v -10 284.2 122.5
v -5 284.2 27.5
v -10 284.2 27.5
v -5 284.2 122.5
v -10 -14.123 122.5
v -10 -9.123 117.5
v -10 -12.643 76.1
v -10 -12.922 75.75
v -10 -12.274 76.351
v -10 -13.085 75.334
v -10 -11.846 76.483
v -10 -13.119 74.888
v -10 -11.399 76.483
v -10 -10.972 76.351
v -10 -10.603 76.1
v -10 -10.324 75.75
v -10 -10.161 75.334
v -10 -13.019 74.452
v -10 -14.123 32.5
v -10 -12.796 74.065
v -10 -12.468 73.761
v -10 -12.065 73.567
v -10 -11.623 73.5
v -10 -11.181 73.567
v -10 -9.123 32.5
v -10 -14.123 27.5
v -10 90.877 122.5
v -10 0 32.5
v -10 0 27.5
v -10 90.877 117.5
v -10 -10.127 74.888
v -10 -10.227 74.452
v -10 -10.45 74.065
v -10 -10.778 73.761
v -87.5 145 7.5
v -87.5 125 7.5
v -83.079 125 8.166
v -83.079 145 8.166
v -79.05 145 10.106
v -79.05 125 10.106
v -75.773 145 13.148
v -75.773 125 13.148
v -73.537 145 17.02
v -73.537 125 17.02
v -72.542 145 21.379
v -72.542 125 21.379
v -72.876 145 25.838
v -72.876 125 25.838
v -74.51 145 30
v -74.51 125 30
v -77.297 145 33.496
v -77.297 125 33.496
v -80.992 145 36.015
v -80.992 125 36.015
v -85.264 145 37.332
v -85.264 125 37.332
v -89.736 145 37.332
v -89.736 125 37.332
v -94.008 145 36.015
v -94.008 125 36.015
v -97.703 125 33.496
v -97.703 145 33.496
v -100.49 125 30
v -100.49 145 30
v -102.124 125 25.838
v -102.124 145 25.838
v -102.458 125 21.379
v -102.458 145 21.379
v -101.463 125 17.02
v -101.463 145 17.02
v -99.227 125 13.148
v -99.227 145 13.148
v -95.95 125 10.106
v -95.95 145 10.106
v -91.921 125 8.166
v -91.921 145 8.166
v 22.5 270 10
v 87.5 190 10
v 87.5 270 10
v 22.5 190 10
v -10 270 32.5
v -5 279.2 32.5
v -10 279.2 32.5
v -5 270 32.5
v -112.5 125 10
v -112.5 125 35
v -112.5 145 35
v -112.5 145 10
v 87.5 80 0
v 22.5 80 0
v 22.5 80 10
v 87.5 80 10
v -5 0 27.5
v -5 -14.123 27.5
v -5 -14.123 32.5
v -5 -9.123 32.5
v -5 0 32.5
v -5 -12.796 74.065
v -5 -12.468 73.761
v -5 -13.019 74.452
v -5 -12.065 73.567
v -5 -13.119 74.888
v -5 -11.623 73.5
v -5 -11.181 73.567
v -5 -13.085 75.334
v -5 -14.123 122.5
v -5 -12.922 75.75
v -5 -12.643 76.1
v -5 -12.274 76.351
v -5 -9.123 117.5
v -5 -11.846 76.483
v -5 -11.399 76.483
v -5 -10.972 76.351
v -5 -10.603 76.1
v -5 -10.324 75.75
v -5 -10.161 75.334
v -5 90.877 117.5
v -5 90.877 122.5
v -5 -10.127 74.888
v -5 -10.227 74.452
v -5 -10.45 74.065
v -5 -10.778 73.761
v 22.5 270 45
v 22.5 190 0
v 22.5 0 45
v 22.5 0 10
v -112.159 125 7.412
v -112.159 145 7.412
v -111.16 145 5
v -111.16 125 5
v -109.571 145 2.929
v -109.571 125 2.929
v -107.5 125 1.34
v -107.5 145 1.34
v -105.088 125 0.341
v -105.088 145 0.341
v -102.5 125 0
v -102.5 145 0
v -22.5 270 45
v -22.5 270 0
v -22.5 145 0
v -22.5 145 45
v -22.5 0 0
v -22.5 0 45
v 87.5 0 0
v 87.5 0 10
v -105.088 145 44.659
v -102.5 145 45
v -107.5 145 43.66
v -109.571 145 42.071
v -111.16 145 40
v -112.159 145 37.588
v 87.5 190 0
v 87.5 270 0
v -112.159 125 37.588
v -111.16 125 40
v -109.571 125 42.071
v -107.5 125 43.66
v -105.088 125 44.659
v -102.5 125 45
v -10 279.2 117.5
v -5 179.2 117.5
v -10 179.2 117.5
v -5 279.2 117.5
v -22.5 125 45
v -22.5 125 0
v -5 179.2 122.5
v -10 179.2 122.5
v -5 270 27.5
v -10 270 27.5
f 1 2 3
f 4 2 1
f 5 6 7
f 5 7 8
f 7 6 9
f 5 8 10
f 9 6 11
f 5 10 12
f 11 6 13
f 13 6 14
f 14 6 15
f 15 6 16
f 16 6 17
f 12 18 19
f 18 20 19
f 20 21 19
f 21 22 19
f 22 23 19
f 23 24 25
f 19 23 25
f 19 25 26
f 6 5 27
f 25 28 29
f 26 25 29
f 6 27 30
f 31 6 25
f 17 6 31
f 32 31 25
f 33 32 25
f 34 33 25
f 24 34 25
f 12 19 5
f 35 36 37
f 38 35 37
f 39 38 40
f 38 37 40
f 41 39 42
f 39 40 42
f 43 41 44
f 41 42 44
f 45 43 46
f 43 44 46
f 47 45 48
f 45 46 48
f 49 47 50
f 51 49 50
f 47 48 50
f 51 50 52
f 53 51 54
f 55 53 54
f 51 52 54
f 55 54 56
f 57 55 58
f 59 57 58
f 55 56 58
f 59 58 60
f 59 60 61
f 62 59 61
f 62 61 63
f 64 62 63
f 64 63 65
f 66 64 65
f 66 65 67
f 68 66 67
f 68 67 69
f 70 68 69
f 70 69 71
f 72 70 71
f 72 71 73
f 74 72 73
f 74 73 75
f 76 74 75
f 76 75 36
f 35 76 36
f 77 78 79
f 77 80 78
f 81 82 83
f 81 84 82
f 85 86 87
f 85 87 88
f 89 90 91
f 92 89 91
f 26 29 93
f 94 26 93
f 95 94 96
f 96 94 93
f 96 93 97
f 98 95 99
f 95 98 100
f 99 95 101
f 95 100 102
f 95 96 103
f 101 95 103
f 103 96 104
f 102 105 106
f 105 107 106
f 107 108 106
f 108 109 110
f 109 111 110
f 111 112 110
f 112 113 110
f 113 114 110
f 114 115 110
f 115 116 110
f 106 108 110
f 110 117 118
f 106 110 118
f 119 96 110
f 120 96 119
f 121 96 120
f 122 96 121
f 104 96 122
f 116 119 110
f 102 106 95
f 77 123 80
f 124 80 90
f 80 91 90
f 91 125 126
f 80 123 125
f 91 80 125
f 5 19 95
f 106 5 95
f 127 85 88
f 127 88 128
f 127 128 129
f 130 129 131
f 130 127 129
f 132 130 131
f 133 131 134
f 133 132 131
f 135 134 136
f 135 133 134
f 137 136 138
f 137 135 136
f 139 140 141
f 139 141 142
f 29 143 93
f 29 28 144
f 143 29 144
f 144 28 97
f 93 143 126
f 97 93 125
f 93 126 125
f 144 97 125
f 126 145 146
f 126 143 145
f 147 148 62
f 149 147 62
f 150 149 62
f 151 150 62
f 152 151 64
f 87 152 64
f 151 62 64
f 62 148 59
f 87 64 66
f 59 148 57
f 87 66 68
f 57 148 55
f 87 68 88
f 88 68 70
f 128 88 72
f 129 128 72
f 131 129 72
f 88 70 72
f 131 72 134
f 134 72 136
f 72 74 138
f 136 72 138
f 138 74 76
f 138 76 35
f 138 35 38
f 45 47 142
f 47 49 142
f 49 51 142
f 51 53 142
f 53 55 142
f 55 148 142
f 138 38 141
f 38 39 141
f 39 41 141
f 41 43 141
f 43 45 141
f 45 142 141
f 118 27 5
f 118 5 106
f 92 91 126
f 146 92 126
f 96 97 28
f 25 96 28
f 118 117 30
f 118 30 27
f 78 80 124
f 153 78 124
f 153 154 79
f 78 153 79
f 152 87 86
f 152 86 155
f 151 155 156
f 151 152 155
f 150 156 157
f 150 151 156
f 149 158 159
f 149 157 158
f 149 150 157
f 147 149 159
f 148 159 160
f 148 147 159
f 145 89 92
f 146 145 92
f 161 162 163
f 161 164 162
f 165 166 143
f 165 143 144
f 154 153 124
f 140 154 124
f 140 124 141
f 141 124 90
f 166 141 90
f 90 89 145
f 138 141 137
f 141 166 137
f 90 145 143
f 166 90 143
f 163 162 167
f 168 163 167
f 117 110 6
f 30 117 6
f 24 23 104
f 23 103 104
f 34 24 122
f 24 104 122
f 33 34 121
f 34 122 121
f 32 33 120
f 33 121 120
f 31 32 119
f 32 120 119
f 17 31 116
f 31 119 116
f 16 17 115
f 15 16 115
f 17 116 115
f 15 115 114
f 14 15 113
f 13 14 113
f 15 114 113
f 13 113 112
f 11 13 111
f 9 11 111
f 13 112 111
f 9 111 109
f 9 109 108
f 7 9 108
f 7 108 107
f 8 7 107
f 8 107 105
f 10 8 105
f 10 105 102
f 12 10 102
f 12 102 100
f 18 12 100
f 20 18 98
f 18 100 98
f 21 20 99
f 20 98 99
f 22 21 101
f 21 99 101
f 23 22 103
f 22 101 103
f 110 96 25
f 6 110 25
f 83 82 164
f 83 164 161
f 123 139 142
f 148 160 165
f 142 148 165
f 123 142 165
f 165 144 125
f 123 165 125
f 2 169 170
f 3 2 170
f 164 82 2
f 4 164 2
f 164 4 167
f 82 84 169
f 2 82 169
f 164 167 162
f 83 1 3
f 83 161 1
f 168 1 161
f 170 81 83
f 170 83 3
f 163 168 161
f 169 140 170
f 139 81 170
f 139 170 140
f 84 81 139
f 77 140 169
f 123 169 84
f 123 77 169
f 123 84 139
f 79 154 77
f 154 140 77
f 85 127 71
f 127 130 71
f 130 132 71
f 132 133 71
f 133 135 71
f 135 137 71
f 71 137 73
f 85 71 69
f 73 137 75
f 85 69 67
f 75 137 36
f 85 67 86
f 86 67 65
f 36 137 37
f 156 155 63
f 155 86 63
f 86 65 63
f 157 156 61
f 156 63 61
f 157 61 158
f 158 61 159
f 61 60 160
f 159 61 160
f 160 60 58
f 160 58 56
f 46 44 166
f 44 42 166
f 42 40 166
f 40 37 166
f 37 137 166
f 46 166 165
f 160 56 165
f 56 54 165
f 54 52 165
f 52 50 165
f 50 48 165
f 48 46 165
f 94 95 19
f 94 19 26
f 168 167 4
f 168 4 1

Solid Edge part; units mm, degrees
sketch "Sketch1" plane through (0, 0, 0) normal (0, -1, 0) x (1, 0, 0)
  line L0 (-22.5, 45) -> (22.5, 45)
  line L1 (22.5, 45) -> (22.5, 0)
  line L2 (22.5, 0) -> (-22.5, 0)
  line L3 (-22.5, 0) -> (-22.5, 45)
  dimension "D1" = 45
  dimension "D2" = 45
  dimension "D3" = 45
  dimension "D4" = 45
extrude "Protrusion1" add sketch "Sketch1" against normal blind 270
sketch "Sketch2" plane through (22.5, 276.5897, 32.5) normal (1, 0, 0) x (0, 1, 0)
  line L0 (-86.5897, -22.5) -> (-86.5897, -32.5)
  line L1 (-86.5897, -32.5) -> (-6.5897, -32.5)
  line L2 (-6.5897, -22.5) -> (-6.5897, -32.5)
  line L3 (-86.5897, -22.5) -> (-6.5897, -22.5)
  line L4 (-276.5897, -22.5) -> (-276.5897, -32.5)
  line L5 (-196.5897, -32.5) -> (-276.5897, -32.5)
  line L6 (-196.5897, -32.5) -> (-196.5897, -22.5)
  line L7 (-196.5897, -22.5) -> (-276.5897, -22.5)
  dimension "D1" = 80
  dimension "D2" = 10
  dimension "D3" = 80
  dimension "D4" = 10
extrude "ExtrudedProtrusion_3" add sketch "Sketch2" along normal blind 65
sketch "Sketch3" plane through (50, 0, 15) normal (0, -1, 0) x (1, 0, 0)
  line L0 (-60, 17.5) -> (-60, 12.5)
  line L1 (-60, 12.5) -> (-55, 12.5)
  line L2 (-55, 12.5) -> (-55, 17.5)
  line L3 (-55, 17.5) -> (-60, 17.5)
extrude "ExtrudedProtrusion_5" add sketch "Sketch3" along normal blind 14.1229
sketch "Sketch4" plane through (0, -7.0615, 32.5) normal (0, 0, 1) x (0, 1, 0)
  line L0 (-7.0615, 10) -> (-7.0615, 5)
  line L1 (-7.0615, 5) -> (-2.0615, 5)
  line L2 (-2.0615, 5) -> (-2.0615, 10)
  line L3 (-2.0615, 10) -> (-7.0615, 10)
  dimension "D1" = 5
extrude "ExtrudedProtrusion_6" add sketch "Sketch4" along normal blind 90
sketch "Sketch5" plane through (0, -9.1229, 61.3303) normal (0, 1, 0) x (0, 0, -1)
  line L0 (-61.1697, 10) -> (-61.1697, 5)
  line L1 (-61.1697, 5) -> (-56.1697, 5)
  line L2 (-56.1697, 5) -> (-56.1697, 10)
  line L3 (-56.1697, 10) -> (-61.1697, 10)
  dimension "D1" = 5
extrude "ExtrudedProtrusion_7" add sketch "Sketch5" along normal blind 100
sketch "Sketch6" plane through (50, 270, 15) normal (0, 1, 0) x (0, 0, -1)
  line L0 (-17.5, 55) -> (-12.5, 55)
  line L1 (-12.5, 55) -> (-12.5, 60)
  line L2 (-17.5, 60) -> (-12.5, 60)
  line L3 (-17.5, 55) -> (-17.5, 60)
  dimension "D1" = 5
  dimension "D2" = 5
  dimension "D3" = 12.5
  dimension "D4" = 27.5
  dimension "D5" = 12.5
extrude "ExtrudedProtrusion_8" add sketch "Sketch6" along normal blind 14.2
sketch "Sketch7" plane through (0, 377.1, 32.5) normal (0, 0, 1) x (0, 1, 0)
  line L0 (-97.9, 10) -> (-92.9, 10)
  line L1 (-92.9, 10) -> (-92.9, 5)
  line L2 (-92.9, 5) -> (-97.9, 5)
  line L3 (-97.9, 5) -> (-97.9, 10)
  dimension "D1" = 5
  dimension "D2" = 5
extrude "ExtrudedProtrusion_9" add sketch "Sketch7" along normal blind 90
sketch "Sketch8" plane through (0, 279.2, 62.5) normal (0, -1, 0) x (0, 0, 1)
  line L0 (55, 10) -> (60, 10)
  line L1 (60, 10) -> (60, 5)
  line L2 (60, 5) -> (55, 5)
  line L3 (55, 5) -> (55, 10)
  dimension "D1" = 5
  dimension "D2" = 5
extrude "ExtrudedProtrusion_10" add sketch "Sketch8" along normal blind 100
sketch "Sketch9" plane through (-22.5, 185, 15) normal (-1, 0, 0) x (0, 1, 0)
  line L0 (-60, 15) -> (-60, -30)
  line L1 (-60, -30) -> (-40, -30)
  line L2 (-40, -30) -> (-40, 15)
  line L3 (-40, 15) -> (-60, 15)
  dimension "D1" = 45
  dimension "D2" = 20
  dimension "D3" = 125
extrude "ExtrudedProtrusion_11" add sketch "Sketch9" along normal blind 90
hole "Hole_1" at (-87.5, 125, 22.5) direction (0, 1, 0) diameter 30 end up to next
fillet "Round_1" radius 10 2 edges at (-112.5, 135, 0) (-112.5, 135, 45)
hole "Hole_2" at (-5, -11.6229, 75) direction (-1, 0, 0) diameter 3 end up to next
extrude "Protrusion2" [suppressed]
